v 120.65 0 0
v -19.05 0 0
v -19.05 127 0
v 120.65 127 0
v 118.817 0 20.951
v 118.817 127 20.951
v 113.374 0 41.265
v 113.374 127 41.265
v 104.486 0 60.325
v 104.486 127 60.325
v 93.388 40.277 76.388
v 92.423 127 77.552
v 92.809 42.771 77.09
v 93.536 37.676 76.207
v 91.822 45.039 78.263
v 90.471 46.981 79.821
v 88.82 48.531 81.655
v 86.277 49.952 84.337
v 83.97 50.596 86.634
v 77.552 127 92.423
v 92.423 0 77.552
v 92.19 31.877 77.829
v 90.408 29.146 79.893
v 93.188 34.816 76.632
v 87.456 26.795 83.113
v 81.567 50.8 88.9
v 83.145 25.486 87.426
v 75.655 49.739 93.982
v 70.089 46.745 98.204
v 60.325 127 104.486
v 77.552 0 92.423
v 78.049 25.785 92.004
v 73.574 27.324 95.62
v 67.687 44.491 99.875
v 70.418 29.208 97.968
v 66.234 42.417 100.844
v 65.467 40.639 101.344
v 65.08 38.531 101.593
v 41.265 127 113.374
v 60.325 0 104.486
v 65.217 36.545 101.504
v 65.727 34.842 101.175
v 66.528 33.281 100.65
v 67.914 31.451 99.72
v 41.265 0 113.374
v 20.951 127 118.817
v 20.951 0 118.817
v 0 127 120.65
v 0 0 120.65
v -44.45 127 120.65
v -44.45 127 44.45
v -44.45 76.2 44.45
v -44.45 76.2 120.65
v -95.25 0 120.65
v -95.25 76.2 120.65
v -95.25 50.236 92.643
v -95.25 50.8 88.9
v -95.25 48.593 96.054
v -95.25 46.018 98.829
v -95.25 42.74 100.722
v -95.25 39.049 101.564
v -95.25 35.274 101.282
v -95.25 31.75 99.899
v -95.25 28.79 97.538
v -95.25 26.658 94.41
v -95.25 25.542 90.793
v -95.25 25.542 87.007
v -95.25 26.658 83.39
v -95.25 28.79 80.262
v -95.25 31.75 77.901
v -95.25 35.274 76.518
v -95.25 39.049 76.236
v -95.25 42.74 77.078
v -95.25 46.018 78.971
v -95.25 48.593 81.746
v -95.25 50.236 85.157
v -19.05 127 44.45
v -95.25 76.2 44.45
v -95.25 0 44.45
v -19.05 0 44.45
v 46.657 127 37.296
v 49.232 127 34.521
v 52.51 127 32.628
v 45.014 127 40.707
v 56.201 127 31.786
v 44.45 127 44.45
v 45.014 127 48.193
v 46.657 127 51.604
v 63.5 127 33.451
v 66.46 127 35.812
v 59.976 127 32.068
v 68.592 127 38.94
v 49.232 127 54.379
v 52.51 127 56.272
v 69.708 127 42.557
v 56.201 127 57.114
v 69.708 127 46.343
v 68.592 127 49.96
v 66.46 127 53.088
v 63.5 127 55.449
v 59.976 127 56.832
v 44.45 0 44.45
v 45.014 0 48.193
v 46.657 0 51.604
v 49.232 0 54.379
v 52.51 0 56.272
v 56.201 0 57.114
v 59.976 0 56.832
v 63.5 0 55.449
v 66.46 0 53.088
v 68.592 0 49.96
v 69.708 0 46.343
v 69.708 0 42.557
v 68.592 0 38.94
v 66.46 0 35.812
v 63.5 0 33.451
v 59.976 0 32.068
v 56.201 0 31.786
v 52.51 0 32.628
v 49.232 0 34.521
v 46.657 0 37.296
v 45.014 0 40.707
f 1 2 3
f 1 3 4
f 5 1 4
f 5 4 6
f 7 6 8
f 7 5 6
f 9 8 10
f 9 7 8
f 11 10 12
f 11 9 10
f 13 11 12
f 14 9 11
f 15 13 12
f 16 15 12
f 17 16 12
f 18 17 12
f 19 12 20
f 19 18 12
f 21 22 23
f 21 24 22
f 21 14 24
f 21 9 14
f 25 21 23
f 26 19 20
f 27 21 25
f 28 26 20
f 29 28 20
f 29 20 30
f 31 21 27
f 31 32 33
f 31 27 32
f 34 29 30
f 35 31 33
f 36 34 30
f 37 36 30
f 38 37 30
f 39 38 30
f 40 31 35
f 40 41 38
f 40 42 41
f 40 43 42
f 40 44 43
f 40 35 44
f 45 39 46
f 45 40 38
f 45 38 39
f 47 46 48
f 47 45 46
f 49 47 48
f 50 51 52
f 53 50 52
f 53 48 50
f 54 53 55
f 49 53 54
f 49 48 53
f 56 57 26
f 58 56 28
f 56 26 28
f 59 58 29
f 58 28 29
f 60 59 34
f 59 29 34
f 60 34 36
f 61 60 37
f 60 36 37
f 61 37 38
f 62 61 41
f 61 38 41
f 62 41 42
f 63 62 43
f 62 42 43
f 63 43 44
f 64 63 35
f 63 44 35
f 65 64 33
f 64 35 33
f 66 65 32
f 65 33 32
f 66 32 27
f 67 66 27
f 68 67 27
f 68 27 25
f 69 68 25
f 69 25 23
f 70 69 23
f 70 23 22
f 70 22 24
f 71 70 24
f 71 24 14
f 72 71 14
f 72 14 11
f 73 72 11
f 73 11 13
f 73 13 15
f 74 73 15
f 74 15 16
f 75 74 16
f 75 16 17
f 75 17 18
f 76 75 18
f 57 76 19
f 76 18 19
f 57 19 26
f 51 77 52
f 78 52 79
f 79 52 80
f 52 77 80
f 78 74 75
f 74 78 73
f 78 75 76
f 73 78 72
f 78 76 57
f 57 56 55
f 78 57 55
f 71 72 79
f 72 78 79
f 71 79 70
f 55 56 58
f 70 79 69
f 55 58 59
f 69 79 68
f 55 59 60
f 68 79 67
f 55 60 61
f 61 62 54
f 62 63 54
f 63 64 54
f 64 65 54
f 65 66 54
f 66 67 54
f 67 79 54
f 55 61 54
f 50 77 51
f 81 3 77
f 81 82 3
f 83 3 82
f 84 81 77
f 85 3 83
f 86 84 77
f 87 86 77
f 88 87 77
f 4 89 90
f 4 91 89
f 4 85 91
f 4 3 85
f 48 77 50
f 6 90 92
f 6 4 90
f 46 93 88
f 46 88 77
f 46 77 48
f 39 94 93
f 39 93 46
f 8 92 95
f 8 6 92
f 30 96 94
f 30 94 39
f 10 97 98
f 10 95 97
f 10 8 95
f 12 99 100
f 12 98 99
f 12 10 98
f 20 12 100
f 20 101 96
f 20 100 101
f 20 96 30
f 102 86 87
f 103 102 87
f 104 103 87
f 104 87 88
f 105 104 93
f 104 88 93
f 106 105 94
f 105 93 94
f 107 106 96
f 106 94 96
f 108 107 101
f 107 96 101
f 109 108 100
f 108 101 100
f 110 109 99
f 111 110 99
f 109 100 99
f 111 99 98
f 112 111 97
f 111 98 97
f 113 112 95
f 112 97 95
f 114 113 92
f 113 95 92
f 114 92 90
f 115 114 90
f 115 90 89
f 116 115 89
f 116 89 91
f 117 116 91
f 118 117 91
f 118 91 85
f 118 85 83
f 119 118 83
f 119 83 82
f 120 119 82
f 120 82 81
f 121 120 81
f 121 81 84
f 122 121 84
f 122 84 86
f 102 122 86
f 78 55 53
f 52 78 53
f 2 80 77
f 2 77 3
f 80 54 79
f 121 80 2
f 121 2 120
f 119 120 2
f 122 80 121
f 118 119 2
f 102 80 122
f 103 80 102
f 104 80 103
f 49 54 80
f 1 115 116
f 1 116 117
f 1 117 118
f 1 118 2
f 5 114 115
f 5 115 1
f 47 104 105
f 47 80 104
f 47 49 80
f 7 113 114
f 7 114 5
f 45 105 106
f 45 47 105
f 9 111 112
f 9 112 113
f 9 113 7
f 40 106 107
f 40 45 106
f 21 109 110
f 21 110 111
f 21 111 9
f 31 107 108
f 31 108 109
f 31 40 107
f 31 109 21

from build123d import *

# Parameters (mm, degrees)
F1_DEPTH  = 127
F2_DEPTH  = 127
F3_D      = 25.4
F0_W      = 76.2
F0_H      = 76.2
F4_DEPTH  = 76.2
F6_D      = 25.4
F9_W      = 50.8
F9_H      = 76.2
F10_DEPTH = 25.4


# Not quite as in the source:
# - a feature of the source that left no trace in its solid (it failed there, or was rolled back) is left out
# - a feature names something its author has since deleted; it is built from what else it names


with BuildPart() as f1:
    # F0 (on Front) → F1 (new body)
    with BuildSketch(Plane.XZ):
        with BuildLine():
            Line((0, 0), (120.65, 0))
            ThreePointArc((120.65, 0), (85.3124331502, 85.3124331502), (0, 120.65))
            Line((0, 120.65), (0, 44.45))
            Line((0, 44.45), (0, 0))
        make_face()
    extrude(amount=-F1_DEPTH)

    # F0 (on Front) → F2 (join)
    with BuildSketch(Plane.XZ):
        Polygon((0, 44.45), (0, 120.65), (-19.05, 120.65), (-19.05, 44.45), (-19.05, 0), (0, 0), align=None)
    extrude(amount=-F2_DEPTH)

    # F3 (through all)
    with Locations(Plane.XZ):
        with Locations((57.15, 44.45)):
            Hole(F3_D / 2)

    # F0 (on Front) → F4 (join)
    with BuildSketch(Plane.XZ):
        with Locations((-57.15, 82.55)):
            Rectangle(F0_W, F0_H)
    extrude(amount=-F4_DEPTH)

    # F6 (through all)
    with Locations(Plane(origin=(-95.25, 0, 0), x_dir=(0, -1, 0), z_dir=(-1, 0, 0))):
        with Locations((-38.1, 88.9)):
            Hole(F6_D / 2)

    # F9 (on face) → F10 (join)
    with BuildSketch(Plane(origin=(-19.05, 0, 0), x_dir=(0, -1, 0), z_dir=(-1, 0, 0))):
        with Locations((-101.6, 82.55)):
            Rectangle(F9_W, F9_H)
    extrude(amount=F10_DEPTH)


solid = f1.part
